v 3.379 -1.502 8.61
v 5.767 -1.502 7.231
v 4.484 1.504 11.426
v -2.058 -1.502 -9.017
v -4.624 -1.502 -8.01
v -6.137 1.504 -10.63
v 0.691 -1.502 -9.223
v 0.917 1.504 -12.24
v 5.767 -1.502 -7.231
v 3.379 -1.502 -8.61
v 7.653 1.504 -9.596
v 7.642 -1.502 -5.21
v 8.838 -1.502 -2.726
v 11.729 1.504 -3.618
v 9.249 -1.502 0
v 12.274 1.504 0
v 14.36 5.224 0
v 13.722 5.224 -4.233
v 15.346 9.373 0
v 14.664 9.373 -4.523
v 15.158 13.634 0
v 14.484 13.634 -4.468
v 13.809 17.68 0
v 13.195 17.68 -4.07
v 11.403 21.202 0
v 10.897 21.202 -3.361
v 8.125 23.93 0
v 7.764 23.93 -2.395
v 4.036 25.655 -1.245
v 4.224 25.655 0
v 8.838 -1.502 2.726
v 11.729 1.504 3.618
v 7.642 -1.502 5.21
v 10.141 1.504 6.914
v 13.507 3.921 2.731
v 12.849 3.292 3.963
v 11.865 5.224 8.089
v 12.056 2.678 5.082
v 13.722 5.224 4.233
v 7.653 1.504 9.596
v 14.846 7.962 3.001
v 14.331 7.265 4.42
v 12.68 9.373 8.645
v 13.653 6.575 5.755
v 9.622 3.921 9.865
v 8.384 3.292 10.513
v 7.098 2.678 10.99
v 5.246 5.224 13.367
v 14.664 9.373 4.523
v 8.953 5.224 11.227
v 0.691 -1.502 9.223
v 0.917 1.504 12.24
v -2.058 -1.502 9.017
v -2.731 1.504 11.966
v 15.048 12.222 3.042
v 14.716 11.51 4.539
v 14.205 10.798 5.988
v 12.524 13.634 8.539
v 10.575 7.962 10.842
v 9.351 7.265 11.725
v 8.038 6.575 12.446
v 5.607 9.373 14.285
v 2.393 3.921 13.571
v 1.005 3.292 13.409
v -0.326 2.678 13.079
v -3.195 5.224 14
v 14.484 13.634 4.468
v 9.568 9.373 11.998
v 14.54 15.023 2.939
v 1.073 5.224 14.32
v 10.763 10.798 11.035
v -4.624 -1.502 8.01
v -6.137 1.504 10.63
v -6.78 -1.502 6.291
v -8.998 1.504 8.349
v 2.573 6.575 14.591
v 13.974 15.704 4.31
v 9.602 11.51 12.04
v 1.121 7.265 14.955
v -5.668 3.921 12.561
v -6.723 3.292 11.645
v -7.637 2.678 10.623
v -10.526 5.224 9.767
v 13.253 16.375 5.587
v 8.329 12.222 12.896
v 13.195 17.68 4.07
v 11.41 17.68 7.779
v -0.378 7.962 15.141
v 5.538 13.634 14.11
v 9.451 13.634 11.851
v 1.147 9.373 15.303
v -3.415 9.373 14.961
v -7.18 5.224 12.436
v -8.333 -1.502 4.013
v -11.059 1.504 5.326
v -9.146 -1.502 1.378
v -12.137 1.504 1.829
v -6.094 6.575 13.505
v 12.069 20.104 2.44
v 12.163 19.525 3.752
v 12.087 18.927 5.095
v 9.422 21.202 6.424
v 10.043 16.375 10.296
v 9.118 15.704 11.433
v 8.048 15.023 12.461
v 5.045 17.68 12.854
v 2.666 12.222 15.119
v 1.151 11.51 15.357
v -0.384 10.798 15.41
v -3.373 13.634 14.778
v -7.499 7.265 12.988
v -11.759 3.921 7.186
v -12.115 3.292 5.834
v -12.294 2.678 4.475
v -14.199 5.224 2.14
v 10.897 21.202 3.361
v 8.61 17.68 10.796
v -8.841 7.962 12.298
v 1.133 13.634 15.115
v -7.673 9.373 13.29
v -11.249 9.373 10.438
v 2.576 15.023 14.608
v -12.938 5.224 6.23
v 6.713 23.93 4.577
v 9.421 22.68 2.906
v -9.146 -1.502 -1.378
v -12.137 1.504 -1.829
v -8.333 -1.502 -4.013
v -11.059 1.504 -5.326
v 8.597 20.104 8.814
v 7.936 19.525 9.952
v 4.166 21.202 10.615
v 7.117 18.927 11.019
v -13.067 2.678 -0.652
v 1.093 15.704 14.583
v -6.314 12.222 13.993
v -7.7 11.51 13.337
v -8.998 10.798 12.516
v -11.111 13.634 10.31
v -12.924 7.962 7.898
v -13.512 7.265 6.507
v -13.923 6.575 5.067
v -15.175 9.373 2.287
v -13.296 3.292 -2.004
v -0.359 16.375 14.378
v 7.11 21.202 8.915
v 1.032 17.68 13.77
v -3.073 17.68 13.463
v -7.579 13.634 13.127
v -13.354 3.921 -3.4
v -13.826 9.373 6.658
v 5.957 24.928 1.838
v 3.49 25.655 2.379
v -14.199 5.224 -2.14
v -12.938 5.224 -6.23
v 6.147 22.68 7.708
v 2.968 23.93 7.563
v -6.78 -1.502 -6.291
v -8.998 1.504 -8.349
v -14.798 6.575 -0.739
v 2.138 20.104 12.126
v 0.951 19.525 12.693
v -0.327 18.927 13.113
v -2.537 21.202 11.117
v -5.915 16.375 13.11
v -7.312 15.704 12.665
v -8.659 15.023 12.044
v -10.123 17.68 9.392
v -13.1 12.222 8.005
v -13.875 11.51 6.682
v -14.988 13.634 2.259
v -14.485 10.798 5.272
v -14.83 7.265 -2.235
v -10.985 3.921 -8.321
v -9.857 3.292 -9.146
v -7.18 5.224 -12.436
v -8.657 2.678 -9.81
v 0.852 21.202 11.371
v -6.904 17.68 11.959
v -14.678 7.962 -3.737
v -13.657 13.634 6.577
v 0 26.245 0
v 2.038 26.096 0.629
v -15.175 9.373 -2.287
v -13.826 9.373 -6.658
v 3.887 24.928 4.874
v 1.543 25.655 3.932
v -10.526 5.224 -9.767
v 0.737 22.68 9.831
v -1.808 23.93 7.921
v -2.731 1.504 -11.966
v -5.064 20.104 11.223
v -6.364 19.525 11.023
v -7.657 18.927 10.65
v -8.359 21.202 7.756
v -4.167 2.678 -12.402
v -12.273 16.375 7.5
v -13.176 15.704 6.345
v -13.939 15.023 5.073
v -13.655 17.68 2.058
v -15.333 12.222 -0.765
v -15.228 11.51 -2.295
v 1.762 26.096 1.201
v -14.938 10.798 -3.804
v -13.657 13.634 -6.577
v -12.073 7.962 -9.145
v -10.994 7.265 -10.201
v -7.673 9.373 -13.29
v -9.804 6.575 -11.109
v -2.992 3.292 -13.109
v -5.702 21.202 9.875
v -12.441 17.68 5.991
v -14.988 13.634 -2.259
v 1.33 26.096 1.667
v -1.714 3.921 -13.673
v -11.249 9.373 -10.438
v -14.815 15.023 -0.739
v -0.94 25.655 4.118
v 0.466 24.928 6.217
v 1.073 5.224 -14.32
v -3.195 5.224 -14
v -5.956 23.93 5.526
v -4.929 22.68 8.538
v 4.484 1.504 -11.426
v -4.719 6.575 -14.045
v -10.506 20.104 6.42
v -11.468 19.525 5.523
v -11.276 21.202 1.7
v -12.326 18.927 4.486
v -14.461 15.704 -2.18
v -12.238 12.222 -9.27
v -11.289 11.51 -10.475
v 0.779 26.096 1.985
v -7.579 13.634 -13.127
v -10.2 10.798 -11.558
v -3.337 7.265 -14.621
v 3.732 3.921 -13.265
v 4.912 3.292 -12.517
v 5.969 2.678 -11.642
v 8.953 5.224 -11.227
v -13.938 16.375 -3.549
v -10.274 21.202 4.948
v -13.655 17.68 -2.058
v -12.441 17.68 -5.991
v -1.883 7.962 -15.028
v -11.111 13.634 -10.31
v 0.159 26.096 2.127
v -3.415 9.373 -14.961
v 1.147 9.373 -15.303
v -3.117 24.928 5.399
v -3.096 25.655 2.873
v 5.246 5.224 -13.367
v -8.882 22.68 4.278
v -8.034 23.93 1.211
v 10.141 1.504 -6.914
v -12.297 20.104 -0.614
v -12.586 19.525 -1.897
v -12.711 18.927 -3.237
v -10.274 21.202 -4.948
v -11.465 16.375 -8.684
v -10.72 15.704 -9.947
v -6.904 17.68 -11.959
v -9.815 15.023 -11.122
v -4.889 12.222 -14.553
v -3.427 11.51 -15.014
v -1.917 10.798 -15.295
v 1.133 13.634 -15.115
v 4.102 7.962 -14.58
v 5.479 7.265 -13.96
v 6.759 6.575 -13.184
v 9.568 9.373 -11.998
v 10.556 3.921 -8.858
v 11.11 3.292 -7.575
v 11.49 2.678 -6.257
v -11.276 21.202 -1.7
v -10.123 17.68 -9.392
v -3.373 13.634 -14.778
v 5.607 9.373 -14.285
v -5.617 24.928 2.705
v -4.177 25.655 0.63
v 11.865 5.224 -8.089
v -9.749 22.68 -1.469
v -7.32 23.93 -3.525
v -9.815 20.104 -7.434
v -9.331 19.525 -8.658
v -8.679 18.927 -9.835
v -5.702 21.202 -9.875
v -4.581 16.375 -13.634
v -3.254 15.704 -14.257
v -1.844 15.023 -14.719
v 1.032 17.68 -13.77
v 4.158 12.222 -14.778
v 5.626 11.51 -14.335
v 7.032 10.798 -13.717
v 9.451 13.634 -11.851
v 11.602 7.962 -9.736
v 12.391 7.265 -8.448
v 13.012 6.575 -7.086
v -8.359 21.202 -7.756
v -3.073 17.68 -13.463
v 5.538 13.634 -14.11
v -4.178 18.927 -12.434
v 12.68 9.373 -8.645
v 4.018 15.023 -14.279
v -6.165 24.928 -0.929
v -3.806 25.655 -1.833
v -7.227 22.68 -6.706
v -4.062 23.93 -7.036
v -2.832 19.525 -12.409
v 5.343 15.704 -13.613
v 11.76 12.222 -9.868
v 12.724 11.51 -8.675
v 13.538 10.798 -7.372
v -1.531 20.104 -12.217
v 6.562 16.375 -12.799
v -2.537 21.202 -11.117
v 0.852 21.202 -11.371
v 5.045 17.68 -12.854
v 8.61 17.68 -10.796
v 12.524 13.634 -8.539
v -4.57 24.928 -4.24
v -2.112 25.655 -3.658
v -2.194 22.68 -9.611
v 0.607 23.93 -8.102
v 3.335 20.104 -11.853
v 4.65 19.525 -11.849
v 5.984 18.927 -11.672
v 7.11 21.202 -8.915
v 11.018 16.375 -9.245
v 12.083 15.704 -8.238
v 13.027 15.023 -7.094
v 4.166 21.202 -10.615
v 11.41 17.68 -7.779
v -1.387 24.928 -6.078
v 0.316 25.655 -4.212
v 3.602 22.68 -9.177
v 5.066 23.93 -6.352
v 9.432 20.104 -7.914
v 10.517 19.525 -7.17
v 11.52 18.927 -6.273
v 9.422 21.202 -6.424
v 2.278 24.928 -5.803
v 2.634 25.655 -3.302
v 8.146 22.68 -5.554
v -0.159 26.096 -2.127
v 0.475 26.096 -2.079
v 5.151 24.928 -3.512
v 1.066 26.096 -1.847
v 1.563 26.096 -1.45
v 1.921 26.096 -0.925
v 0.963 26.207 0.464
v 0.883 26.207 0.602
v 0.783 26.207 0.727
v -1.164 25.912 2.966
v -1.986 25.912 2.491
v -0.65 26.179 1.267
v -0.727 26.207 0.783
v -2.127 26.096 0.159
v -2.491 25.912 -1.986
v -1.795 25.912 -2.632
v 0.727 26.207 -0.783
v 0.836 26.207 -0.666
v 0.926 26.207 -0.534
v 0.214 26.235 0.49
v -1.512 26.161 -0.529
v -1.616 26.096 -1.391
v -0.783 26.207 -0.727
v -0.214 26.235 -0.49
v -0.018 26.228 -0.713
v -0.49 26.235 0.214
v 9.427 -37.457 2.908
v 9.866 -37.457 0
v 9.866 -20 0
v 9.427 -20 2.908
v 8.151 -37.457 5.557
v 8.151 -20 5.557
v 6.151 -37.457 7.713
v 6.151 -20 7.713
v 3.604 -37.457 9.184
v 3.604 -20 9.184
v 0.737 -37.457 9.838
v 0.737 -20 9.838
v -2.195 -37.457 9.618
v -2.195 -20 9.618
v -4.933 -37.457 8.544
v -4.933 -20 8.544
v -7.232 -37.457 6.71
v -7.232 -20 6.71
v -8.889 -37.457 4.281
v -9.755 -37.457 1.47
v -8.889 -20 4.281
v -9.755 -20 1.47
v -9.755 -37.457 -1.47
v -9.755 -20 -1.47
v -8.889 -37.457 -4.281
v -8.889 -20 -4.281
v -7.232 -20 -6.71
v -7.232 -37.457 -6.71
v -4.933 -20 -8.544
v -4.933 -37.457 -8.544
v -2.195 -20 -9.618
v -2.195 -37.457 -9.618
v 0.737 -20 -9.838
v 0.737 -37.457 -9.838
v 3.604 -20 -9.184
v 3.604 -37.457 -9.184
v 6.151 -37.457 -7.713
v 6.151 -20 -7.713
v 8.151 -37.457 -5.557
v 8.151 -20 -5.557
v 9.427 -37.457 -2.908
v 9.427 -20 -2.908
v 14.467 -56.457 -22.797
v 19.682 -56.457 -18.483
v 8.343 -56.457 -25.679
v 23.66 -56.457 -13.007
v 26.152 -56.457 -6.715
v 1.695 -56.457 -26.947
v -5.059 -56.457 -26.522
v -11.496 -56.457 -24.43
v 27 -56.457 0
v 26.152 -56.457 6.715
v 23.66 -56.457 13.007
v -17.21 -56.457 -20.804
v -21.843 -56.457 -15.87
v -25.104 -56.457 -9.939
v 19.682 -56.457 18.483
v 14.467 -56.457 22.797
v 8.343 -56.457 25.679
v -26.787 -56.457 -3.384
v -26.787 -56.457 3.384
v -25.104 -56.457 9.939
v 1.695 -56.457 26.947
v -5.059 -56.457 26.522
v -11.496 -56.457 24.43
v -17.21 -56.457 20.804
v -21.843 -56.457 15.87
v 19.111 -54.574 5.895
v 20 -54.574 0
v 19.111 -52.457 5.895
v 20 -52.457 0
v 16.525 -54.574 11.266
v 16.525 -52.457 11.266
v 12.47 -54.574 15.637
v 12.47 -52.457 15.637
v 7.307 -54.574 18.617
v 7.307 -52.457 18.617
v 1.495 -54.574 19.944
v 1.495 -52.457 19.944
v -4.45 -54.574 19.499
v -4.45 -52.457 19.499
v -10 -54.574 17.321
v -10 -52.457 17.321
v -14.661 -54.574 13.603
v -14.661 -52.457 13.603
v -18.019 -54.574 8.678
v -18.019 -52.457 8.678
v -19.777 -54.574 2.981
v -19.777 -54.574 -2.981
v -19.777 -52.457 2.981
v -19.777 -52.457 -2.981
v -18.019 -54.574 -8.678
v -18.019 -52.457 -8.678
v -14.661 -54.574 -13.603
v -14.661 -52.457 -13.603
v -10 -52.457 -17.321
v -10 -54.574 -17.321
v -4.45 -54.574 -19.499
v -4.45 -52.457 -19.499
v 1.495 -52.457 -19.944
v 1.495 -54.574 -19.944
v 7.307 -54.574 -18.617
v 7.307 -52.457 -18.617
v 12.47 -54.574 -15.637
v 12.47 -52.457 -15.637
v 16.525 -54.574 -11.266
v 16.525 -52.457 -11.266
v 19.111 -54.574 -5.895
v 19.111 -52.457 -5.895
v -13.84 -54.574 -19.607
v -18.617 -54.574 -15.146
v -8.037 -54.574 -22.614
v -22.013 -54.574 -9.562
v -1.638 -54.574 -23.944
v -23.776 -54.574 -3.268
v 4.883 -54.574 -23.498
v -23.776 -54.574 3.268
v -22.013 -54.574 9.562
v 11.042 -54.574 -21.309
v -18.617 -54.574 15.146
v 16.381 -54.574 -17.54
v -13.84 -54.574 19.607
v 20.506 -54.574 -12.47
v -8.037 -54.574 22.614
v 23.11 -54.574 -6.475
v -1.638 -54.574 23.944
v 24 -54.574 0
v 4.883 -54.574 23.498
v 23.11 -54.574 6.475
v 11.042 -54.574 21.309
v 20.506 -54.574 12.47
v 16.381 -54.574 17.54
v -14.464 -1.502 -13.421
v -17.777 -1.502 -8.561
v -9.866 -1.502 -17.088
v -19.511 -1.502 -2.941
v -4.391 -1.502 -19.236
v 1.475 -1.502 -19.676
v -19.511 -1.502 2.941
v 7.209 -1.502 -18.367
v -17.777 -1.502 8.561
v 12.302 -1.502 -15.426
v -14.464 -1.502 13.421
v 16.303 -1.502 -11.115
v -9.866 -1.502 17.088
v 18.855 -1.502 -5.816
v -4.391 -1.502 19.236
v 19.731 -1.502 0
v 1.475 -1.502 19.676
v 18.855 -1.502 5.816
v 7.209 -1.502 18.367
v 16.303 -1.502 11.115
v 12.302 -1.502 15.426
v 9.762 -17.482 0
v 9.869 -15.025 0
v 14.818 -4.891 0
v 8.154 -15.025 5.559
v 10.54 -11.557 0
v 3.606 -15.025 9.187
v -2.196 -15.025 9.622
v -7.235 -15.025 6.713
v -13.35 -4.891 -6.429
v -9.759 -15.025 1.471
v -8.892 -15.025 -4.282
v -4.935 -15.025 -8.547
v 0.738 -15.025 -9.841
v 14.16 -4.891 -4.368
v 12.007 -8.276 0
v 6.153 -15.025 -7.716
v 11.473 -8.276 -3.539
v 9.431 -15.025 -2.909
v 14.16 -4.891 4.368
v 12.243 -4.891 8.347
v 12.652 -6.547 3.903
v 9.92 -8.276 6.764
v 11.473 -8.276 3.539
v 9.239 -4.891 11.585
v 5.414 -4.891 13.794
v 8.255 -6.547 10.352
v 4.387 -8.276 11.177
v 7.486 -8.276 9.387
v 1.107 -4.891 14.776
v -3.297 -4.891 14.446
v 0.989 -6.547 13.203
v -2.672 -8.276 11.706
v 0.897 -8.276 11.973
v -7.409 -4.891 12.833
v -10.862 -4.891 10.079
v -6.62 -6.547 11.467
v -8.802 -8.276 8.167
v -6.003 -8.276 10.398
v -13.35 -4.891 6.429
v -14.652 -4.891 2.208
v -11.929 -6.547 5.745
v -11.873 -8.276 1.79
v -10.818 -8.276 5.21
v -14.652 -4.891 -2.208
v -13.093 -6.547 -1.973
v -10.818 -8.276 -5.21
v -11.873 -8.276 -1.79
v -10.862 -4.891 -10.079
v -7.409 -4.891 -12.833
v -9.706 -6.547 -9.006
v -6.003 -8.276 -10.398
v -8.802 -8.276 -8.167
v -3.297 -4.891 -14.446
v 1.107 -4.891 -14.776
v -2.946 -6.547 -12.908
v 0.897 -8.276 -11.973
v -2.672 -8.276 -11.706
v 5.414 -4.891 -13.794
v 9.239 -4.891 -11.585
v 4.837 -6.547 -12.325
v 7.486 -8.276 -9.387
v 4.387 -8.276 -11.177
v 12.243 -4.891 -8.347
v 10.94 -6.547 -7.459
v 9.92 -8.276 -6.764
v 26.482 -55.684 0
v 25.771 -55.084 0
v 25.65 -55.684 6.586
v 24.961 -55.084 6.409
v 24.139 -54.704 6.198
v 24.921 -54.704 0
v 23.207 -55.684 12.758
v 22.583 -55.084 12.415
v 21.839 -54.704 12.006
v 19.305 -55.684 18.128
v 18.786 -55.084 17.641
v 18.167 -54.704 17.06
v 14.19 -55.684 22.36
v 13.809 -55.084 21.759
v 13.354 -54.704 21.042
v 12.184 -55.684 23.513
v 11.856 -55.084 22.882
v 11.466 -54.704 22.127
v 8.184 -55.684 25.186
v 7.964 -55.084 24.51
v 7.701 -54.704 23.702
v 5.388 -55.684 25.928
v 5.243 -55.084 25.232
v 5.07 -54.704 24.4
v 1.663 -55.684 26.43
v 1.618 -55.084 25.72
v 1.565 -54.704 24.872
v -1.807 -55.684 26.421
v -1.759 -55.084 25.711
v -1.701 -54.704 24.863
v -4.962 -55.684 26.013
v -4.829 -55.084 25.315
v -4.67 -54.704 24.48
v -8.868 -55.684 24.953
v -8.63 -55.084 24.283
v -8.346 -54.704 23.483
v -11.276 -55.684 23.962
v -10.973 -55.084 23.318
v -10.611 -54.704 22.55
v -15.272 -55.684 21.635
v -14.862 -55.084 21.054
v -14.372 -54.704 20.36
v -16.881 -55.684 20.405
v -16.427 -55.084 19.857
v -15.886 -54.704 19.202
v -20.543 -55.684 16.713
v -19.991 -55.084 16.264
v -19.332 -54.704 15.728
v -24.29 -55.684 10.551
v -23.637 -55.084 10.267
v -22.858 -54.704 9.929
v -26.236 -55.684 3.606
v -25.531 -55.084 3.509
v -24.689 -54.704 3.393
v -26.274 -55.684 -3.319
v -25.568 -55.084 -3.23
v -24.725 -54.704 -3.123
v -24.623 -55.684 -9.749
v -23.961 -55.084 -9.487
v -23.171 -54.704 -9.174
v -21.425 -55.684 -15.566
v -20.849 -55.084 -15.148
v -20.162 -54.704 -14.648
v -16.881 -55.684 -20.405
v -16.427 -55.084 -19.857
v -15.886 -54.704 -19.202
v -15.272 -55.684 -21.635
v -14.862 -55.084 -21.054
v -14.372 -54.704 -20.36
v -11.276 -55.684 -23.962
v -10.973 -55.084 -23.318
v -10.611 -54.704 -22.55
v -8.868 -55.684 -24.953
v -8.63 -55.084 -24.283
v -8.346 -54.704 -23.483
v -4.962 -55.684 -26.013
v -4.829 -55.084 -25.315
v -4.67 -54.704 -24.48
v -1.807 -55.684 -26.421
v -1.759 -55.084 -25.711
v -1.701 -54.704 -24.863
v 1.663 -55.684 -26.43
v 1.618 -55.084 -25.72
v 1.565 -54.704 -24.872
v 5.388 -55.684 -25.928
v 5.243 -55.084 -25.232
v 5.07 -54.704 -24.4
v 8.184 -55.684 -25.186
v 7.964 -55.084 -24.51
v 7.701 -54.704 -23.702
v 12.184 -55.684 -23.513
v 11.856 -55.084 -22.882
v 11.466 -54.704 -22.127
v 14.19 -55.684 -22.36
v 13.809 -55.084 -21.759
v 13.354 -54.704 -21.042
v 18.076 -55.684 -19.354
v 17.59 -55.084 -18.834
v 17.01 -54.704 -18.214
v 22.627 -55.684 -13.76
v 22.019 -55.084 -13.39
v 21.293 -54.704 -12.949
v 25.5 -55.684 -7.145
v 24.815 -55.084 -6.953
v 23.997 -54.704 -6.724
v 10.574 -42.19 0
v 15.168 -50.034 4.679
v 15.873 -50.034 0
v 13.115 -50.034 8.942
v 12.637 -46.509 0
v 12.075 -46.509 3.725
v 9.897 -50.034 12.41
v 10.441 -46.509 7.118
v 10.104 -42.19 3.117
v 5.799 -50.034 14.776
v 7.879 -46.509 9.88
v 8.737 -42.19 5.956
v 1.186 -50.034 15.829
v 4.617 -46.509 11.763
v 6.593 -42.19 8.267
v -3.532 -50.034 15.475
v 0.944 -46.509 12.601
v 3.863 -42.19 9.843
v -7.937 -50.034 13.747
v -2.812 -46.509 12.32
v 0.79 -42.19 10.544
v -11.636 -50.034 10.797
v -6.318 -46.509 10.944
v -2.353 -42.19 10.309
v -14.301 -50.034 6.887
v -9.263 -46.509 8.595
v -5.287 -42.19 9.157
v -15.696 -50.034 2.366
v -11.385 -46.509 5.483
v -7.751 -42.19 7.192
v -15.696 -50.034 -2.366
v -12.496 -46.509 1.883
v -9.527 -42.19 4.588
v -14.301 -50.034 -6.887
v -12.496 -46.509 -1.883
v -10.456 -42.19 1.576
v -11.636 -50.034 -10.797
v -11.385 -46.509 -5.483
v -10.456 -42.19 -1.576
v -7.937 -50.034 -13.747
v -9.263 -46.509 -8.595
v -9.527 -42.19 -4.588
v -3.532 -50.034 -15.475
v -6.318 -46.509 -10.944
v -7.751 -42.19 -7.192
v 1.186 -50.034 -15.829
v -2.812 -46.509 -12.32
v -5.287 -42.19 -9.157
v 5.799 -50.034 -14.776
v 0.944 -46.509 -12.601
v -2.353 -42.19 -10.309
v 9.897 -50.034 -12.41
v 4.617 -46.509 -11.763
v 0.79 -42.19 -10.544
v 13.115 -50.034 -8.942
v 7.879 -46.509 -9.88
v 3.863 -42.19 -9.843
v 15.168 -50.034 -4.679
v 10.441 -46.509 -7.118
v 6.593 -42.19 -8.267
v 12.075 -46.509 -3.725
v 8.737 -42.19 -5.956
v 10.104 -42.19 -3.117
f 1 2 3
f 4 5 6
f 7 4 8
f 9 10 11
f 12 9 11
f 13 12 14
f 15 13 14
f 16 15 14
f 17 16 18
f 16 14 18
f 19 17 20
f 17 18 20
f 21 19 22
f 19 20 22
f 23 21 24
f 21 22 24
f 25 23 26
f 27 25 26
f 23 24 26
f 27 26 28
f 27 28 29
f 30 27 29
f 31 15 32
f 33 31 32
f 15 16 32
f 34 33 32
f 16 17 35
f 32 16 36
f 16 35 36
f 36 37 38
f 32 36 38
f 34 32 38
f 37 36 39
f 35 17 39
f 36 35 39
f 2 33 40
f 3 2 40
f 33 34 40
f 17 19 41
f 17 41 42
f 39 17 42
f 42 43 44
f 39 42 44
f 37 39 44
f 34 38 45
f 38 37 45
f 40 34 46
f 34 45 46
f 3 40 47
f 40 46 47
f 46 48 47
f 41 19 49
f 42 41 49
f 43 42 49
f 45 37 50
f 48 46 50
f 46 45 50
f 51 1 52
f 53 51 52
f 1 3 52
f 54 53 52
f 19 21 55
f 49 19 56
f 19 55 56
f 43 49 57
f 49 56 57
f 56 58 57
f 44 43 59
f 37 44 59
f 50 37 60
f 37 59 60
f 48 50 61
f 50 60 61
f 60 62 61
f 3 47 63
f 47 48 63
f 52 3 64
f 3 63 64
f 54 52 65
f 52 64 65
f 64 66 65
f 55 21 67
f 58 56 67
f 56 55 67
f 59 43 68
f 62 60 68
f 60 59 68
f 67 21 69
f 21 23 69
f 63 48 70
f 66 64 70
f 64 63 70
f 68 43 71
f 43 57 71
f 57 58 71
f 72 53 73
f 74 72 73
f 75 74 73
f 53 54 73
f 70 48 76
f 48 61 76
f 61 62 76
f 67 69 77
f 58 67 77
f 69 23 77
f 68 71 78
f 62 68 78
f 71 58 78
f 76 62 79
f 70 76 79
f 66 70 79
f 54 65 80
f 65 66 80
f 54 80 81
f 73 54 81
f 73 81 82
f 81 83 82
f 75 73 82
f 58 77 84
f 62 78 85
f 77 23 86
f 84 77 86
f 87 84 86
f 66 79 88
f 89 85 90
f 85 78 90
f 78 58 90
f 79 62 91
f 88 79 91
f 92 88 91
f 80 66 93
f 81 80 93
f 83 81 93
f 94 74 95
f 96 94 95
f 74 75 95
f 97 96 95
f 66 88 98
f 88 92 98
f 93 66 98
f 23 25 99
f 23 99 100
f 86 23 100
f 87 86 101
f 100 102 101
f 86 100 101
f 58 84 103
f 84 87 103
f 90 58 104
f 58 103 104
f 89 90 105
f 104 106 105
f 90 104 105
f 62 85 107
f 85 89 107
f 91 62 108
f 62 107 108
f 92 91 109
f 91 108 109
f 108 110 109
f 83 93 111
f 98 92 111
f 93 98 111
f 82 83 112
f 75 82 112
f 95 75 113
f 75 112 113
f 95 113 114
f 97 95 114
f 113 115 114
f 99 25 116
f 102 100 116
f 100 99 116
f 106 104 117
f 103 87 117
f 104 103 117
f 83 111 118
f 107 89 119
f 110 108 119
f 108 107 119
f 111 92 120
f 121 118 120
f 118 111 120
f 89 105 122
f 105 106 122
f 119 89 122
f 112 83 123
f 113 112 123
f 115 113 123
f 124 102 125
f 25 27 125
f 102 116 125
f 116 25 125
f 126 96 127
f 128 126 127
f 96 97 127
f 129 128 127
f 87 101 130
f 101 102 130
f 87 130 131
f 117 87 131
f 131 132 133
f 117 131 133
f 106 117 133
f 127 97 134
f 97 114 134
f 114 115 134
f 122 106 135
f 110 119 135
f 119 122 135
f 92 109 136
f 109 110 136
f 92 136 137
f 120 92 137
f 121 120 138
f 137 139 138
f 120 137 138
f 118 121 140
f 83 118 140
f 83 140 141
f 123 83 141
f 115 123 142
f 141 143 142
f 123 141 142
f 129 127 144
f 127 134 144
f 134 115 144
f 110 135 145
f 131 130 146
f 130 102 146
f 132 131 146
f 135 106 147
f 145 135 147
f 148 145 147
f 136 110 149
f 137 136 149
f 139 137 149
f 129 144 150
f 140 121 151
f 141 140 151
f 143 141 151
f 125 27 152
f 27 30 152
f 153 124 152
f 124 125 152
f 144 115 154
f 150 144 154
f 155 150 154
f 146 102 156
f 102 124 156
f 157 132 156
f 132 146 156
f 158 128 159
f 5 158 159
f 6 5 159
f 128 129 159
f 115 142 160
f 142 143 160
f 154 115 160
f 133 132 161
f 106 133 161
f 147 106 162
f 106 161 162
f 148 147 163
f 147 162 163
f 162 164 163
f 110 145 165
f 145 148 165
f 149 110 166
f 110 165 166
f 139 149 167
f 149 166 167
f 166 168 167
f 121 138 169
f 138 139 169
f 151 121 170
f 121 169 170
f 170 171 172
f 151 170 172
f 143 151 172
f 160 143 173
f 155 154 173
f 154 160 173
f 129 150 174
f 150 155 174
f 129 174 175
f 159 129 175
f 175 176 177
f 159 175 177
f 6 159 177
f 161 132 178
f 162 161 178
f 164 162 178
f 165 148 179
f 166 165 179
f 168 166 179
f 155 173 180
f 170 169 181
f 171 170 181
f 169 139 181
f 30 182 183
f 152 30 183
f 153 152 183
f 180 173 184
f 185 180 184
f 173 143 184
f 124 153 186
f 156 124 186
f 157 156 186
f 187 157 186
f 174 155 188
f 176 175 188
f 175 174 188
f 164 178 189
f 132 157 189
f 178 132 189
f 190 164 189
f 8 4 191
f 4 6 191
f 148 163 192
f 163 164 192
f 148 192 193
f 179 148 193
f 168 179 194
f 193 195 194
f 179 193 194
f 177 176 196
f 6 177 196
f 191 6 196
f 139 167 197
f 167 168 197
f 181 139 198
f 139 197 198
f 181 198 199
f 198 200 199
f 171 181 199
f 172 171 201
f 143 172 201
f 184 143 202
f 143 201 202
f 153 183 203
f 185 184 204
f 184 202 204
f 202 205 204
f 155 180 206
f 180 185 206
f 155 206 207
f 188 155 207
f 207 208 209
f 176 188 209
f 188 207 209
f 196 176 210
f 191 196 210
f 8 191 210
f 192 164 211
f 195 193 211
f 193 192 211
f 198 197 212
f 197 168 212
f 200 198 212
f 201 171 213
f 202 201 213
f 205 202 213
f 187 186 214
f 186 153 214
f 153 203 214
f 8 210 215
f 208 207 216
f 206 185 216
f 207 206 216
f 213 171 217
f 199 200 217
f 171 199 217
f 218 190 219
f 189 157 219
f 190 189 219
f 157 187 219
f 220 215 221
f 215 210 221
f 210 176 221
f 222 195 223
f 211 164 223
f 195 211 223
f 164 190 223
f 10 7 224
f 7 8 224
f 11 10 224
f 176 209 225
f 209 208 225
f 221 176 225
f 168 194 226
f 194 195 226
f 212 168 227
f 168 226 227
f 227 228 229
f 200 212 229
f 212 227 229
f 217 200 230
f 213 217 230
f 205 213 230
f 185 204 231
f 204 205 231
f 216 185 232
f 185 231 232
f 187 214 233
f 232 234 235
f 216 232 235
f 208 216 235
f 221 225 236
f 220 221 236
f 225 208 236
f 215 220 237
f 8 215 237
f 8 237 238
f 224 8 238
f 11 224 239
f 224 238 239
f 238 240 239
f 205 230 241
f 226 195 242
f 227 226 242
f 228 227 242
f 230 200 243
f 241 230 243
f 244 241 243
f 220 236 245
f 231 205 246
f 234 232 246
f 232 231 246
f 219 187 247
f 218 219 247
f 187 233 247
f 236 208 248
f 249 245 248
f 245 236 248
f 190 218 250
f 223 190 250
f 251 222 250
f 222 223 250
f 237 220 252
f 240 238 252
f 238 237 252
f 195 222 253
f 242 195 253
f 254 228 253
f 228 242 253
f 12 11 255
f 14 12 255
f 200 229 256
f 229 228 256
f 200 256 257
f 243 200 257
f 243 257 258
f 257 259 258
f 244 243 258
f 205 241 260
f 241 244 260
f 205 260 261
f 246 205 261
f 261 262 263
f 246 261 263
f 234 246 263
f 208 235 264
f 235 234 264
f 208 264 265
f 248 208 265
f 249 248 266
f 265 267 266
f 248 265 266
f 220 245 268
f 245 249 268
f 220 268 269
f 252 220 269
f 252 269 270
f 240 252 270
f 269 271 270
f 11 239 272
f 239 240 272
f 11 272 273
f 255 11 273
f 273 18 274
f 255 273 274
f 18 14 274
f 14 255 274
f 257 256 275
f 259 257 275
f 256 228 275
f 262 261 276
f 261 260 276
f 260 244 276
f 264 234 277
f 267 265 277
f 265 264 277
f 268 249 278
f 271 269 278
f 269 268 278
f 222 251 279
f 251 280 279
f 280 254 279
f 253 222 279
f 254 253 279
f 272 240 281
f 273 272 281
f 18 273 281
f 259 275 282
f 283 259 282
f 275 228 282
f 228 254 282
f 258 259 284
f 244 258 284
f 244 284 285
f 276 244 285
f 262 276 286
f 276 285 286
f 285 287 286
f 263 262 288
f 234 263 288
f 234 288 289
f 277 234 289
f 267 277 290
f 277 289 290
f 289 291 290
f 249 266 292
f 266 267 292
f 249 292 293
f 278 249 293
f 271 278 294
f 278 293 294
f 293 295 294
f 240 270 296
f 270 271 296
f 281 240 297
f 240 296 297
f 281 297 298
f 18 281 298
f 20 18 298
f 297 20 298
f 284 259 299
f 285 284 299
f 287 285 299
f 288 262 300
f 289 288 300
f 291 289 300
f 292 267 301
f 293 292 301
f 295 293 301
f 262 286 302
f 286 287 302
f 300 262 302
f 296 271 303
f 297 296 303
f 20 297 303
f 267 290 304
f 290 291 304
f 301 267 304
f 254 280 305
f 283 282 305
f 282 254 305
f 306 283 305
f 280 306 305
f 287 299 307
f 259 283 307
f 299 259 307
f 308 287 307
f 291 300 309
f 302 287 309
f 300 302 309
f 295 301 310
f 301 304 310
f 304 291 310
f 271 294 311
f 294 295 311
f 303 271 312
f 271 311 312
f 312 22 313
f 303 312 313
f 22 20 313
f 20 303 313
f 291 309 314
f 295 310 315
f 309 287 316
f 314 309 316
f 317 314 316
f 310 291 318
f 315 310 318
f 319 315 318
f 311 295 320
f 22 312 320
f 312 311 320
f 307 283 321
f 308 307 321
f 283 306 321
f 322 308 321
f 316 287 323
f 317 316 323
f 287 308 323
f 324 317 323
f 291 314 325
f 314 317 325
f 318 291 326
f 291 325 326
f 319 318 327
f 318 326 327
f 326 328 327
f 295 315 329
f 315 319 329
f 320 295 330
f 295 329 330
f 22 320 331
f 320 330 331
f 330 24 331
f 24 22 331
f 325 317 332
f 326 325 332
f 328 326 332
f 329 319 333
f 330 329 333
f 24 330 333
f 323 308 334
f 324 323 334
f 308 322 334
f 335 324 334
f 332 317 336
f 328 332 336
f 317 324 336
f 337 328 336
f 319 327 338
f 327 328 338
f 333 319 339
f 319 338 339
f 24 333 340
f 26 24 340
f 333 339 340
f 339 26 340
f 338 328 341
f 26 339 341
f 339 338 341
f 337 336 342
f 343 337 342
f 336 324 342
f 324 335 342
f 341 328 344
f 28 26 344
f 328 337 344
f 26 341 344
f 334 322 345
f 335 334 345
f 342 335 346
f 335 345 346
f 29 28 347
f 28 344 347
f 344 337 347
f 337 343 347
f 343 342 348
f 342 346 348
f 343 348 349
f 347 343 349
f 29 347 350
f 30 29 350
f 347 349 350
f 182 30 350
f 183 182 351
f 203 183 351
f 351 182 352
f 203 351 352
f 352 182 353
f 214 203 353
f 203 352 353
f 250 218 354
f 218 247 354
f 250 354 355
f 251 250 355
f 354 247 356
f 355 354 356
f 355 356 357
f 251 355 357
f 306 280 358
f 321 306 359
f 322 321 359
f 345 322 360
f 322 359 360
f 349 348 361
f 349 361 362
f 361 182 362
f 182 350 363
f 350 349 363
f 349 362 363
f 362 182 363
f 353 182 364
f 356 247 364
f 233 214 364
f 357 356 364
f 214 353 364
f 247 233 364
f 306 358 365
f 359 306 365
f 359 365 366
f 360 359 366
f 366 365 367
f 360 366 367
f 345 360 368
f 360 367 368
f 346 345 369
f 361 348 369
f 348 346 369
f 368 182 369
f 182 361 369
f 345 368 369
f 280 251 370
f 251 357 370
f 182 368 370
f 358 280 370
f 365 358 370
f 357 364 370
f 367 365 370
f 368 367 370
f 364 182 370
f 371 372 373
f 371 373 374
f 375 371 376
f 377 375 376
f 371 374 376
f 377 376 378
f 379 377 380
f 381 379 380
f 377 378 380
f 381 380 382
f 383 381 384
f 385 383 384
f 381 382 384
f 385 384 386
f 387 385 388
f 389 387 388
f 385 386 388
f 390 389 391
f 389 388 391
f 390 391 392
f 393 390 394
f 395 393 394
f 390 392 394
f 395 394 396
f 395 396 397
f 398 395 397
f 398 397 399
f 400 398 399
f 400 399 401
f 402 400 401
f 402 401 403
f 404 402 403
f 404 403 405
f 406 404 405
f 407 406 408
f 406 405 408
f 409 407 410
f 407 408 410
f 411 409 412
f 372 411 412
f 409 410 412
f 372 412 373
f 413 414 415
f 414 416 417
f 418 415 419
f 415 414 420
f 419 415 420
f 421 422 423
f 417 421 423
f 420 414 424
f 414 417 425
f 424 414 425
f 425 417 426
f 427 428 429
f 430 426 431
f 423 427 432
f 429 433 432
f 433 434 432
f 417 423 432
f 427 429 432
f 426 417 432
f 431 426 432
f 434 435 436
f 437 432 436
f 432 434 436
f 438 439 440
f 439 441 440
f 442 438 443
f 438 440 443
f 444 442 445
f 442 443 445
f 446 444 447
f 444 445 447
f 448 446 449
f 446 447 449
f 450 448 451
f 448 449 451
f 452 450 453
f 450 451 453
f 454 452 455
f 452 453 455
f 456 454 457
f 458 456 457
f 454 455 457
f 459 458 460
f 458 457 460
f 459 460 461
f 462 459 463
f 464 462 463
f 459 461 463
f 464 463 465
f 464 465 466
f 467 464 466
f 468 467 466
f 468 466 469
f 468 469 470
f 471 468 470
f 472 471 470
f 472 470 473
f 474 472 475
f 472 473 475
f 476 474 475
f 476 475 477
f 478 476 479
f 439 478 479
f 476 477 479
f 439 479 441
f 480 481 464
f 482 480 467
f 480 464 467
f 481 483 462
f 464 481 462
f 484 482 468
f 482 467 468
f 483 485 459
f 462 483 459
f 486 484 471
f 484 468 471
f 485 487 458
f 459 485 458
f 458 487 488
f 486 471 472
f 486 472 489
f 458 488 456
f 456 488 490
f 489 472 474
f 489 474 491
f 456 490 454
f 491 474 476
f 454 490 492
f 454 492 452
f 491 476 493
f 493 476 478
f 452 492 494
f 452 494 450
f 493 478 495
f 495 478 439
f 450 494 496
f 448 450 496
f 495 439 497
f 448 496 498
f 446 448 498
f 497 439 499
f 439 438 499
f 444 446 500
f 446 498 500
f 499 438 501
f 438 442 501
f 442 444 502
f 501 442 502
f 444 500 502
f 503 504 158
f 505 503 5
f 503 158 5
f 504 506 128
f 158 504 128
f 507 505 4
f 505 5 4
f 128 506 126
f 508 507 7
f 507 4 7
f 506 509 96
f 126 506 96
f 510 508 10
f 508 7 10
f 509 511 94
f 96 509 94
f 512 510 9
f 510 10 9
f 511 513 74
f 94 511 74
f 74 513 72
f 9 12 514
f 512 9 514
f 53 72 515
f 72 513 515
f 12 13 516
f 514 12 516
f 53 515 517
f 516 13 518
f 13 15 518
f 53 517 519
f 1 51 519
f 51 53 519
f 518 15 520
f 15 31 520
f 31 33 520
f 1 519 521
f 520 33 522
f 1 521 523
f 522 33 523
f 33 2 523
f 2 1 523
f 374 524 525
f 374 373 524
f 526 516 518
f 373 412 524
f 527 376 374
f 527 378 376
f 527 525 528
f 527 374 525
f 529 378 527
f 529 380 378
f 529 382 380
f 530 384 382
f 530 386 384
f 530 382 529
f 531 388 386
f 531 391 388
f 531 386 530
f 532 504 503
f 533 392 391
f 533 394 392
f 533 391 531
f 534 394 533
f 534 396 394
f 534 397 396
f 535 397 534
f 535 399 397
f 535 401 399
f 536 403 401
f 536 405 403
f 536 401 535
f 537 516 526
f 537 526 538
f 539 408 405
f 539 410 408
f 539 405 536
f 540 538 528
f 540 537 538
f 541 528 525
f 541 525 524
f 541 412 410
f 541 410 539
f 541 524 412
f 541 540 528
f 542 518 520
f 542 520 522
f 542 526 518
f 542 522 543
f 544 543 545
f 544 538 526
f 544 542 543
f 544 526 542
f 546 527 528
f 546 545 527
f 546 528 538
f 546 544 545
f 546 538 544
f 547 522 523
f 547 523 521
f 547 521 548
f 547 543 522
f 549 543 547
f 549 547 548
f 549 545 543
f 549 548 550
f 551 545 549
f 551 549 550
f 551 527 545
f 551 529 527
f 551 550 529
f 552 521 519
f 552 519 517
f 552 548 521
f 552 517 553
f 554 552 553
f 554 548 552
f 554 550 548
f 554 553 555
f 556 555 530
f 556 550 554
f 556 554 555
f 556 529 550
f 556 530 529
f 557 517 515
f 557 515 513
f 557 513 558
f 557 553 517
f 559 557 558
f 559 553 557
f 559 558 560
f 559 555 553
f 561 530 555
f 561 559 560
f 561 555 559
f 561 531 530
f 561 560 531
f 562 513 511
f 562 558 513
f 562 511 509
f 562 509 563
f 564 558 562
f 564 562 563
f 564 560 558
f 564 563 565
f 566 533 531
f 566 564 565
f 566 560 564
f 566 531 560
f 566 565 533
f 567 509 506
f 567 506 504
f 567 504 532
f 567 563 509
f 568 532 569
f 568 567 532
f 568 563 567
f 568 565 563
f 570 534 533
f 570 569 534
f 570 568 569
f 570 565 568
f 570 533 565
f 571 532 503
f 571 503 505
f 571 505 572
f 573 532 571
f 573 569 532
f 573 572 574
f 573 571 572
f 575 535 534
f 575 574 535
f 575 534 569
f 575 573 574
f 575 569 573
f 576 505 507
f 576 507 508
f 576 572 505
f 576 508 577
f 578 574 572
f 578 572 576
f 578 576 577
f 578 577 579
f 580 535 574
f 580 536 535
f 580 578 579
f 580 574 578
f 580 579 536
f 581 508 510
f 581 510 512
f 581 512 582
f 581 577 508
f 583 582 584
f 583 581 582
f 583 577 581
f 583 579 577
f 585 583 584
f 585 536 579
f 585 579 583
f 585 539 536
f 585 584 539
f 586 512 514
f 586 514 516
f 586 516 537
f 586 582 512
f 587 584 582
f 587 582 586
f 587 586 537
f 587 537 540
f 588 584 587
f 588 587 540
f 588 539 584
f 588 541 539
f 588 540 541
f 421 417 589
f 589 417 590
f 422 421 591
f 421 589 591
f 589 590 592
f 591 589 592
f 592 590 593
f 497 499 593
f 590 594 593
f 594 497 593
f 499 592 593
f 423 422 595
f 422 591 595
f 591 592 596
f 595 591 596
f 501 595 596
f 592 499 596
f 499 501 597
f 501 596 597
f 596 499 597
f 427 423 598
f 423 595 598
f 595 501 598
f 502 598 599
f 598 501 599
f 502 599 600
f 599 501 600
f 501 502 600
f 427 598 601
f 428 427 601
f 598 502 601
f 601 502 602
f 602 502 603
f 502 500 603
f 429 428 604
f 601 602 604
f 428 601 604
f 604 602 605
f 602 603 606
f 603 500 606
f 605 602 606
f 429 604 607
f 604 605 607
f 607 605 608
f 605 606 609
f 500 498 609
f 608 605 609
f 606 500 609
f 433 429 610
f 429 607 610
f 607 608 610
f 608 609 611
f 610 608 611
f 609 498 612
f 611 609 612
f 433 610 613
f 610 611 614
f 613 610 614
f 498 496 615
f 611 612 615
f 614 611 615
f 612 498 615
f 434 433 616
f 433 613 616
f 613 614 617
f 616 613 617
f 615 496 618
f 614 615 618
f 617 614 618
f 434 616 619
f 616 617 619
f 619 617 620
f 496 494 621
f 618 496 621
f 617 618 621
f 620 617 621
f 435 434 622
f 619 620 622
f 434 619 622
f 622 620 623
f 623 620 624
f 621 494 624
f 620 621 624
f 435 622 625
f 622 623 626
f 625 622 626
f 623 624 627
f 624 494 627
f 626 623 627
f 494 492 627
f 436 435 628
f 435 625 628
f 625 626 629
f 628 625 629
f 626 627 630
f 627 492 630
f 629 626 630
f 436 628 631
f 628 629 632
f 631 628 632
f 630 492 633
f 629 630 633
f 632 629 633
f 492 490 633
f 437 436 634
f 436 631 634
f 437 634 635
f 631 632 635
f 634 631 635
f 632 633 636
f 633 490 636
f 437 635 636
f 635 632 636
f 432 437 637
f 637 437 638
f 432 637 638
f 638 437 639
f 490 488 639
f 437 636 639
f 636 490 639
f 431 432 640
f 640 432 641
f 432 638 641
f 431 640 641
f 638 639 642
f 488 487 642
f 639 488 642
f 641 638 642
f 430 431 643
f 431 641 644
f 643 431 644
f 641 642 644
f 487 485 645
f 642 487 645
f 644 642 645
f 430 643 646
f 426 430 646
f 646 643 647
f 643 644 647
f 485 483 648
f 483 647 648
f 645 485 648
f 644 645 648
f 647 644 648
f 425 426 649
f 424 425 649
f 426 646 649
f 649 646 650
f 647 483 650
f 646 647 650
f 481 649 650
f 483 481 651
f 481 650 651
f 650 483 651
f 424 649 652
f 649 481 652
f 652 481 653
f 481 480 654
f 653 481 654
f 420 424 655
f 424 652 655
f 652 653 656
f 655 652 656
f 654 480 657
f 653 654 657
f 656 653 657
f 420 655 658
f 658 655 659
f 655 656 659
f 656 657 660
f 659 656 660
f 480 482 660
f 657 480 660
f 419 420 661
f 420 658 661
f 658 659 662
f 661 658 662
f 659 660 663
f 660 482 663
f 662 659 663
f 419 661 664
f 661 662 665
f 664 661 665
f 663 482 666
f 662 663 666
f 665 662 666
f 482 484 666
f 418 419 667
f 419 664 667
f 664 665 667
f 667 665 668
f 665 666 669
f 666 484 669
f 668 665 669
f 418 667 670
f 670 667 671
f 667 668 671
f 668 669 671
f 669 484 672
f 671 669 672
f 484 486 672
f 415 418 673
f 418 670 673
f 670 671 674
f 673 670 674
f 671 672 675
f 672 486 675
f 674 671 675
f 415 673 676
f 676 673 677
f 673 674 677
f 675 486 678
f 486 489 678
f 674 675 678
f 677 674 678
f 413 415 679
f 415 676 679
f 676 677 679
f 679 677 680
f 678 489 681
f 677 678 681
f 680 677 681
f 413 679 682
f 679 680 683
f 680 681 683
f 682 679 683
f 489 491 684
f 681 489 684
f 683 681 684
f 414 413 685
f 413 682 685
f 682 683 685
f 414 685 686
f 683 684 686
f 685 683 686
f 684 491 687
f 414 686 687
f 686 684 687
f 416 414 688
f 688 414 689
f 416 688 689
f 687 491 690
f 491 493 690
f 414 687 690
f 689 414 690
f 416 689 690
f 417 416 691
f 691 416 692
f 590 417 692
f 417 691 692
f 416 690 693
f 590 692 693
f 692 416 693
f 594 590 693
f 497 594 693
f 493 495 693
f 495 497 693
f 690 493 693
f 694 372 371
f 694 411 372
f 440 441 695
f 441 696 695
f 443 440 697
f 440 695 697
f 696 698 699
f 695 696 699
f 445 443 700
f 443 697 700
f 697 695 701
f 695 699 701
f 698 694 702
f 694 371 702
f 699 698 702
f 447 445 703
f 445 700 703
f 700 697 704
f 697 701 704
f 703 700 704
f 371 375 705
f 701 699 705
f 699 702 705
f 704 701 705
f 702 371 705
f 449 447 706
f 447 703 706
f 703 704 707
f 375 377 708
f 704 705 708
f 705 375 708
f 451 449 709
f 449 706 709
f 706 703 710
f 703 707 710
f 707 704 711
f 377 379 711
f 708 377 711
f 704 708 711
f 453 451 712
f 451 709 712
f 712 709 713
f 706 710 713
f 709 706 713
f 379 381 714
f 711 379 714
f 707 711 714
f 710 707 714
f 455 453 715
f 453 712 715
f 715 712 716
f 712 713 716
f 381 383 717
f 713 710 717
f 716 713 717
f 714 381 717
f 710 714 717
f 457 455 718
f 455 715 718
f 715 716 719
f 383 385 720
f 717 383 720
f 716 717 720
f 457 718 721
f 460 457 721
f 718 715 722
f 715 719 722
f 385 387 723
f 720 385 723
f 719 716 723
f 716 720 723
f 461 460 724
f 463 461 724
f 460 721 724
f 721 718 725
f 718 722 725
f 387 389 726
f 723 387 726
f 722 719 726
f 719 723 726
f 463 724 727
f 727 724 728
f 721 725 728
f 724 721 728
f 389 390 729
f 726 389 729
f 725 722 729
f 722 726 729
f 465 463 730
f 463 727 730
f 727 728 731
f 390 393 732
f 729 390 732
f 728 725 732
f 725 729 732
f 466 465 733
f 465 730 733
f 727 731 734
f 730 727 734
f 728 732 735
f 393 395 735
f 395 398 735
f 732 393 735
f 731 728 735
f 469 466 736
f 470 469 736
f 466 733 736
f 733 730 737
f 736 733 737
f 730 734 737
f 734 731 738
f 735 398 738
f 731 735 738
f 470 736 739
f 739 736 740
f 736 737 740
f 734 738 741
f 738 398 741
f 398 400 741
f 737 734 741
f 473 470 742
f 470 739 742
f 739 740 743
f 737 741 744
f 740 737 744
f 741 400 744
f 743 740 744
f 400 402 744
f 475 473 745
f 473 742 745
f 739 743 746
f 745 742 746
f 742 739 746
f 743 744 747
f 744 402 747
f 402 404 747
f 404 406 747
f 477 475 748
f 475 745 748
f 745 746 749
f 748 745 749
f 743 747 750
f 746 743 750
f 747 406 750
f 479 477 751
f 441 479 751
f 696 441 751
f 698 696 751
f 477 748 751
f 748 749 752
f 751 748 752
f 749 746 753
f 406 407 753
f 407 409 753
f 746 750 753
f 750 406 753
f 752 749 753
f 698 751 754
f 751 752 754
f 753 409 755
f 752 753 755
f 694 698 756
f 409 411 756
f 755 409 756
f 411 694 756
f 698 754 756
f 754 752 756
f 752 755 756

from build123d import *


with BuildPart() as f1:
    # F0 (on Top) → F1 (revolve)
    with BuildSketch(Plane.XY):
        with BuildLine():
            Line((19.731169, -1.502431), (9.248986, -1.502431))
            ThreePointArc((9.248986, -1.502431), (14.62393, 15.704194), (0, 26.244526))
            Line((0, 26.244526), (0, 10.82955))
            Line((0, 10.82955), (0, -1.502431))
            Line((0, -1.502431), (0, -4.585426))
            Line((0, -4.585426), (0, -20.000402))
            Line((0, -20.000402), (0, -37.457439))
            Line((0, -37.457439), (0, -52.457439))
            Line((0, -52.457439), (0, -56.457439))
            Line((0, -56.457439), (27, -56.457439))
            ThreePointArc((27, -56.457439), (25.771046, -55.084057), (24, -54.574247))
            Line((24, -54.574247), (20, -54.574247))
            Line((20, -54.574247), (20, -52.457439))
            ThreePointArc((20, -52.457439), (12.636659, -46.50877), (9.865585, -37.457439))
            Line((9.865585, -37.457439), (9.865585, -20.000402))
            add(Edge.make_bspline(
                [(19.731169, -1.502431), (10.514108, -6.392788), (9.345569, -12.90322), (9.865585, -20.000402)],
                knots=[0, 0, 0, 0, 20.964368, 20.964368, 20.964368, 20.964368], degree=3))
        make_face()
    revolve(axis=Axis((0, 10.82955, 0), (0, -1, 0)))


solid = f1.part
